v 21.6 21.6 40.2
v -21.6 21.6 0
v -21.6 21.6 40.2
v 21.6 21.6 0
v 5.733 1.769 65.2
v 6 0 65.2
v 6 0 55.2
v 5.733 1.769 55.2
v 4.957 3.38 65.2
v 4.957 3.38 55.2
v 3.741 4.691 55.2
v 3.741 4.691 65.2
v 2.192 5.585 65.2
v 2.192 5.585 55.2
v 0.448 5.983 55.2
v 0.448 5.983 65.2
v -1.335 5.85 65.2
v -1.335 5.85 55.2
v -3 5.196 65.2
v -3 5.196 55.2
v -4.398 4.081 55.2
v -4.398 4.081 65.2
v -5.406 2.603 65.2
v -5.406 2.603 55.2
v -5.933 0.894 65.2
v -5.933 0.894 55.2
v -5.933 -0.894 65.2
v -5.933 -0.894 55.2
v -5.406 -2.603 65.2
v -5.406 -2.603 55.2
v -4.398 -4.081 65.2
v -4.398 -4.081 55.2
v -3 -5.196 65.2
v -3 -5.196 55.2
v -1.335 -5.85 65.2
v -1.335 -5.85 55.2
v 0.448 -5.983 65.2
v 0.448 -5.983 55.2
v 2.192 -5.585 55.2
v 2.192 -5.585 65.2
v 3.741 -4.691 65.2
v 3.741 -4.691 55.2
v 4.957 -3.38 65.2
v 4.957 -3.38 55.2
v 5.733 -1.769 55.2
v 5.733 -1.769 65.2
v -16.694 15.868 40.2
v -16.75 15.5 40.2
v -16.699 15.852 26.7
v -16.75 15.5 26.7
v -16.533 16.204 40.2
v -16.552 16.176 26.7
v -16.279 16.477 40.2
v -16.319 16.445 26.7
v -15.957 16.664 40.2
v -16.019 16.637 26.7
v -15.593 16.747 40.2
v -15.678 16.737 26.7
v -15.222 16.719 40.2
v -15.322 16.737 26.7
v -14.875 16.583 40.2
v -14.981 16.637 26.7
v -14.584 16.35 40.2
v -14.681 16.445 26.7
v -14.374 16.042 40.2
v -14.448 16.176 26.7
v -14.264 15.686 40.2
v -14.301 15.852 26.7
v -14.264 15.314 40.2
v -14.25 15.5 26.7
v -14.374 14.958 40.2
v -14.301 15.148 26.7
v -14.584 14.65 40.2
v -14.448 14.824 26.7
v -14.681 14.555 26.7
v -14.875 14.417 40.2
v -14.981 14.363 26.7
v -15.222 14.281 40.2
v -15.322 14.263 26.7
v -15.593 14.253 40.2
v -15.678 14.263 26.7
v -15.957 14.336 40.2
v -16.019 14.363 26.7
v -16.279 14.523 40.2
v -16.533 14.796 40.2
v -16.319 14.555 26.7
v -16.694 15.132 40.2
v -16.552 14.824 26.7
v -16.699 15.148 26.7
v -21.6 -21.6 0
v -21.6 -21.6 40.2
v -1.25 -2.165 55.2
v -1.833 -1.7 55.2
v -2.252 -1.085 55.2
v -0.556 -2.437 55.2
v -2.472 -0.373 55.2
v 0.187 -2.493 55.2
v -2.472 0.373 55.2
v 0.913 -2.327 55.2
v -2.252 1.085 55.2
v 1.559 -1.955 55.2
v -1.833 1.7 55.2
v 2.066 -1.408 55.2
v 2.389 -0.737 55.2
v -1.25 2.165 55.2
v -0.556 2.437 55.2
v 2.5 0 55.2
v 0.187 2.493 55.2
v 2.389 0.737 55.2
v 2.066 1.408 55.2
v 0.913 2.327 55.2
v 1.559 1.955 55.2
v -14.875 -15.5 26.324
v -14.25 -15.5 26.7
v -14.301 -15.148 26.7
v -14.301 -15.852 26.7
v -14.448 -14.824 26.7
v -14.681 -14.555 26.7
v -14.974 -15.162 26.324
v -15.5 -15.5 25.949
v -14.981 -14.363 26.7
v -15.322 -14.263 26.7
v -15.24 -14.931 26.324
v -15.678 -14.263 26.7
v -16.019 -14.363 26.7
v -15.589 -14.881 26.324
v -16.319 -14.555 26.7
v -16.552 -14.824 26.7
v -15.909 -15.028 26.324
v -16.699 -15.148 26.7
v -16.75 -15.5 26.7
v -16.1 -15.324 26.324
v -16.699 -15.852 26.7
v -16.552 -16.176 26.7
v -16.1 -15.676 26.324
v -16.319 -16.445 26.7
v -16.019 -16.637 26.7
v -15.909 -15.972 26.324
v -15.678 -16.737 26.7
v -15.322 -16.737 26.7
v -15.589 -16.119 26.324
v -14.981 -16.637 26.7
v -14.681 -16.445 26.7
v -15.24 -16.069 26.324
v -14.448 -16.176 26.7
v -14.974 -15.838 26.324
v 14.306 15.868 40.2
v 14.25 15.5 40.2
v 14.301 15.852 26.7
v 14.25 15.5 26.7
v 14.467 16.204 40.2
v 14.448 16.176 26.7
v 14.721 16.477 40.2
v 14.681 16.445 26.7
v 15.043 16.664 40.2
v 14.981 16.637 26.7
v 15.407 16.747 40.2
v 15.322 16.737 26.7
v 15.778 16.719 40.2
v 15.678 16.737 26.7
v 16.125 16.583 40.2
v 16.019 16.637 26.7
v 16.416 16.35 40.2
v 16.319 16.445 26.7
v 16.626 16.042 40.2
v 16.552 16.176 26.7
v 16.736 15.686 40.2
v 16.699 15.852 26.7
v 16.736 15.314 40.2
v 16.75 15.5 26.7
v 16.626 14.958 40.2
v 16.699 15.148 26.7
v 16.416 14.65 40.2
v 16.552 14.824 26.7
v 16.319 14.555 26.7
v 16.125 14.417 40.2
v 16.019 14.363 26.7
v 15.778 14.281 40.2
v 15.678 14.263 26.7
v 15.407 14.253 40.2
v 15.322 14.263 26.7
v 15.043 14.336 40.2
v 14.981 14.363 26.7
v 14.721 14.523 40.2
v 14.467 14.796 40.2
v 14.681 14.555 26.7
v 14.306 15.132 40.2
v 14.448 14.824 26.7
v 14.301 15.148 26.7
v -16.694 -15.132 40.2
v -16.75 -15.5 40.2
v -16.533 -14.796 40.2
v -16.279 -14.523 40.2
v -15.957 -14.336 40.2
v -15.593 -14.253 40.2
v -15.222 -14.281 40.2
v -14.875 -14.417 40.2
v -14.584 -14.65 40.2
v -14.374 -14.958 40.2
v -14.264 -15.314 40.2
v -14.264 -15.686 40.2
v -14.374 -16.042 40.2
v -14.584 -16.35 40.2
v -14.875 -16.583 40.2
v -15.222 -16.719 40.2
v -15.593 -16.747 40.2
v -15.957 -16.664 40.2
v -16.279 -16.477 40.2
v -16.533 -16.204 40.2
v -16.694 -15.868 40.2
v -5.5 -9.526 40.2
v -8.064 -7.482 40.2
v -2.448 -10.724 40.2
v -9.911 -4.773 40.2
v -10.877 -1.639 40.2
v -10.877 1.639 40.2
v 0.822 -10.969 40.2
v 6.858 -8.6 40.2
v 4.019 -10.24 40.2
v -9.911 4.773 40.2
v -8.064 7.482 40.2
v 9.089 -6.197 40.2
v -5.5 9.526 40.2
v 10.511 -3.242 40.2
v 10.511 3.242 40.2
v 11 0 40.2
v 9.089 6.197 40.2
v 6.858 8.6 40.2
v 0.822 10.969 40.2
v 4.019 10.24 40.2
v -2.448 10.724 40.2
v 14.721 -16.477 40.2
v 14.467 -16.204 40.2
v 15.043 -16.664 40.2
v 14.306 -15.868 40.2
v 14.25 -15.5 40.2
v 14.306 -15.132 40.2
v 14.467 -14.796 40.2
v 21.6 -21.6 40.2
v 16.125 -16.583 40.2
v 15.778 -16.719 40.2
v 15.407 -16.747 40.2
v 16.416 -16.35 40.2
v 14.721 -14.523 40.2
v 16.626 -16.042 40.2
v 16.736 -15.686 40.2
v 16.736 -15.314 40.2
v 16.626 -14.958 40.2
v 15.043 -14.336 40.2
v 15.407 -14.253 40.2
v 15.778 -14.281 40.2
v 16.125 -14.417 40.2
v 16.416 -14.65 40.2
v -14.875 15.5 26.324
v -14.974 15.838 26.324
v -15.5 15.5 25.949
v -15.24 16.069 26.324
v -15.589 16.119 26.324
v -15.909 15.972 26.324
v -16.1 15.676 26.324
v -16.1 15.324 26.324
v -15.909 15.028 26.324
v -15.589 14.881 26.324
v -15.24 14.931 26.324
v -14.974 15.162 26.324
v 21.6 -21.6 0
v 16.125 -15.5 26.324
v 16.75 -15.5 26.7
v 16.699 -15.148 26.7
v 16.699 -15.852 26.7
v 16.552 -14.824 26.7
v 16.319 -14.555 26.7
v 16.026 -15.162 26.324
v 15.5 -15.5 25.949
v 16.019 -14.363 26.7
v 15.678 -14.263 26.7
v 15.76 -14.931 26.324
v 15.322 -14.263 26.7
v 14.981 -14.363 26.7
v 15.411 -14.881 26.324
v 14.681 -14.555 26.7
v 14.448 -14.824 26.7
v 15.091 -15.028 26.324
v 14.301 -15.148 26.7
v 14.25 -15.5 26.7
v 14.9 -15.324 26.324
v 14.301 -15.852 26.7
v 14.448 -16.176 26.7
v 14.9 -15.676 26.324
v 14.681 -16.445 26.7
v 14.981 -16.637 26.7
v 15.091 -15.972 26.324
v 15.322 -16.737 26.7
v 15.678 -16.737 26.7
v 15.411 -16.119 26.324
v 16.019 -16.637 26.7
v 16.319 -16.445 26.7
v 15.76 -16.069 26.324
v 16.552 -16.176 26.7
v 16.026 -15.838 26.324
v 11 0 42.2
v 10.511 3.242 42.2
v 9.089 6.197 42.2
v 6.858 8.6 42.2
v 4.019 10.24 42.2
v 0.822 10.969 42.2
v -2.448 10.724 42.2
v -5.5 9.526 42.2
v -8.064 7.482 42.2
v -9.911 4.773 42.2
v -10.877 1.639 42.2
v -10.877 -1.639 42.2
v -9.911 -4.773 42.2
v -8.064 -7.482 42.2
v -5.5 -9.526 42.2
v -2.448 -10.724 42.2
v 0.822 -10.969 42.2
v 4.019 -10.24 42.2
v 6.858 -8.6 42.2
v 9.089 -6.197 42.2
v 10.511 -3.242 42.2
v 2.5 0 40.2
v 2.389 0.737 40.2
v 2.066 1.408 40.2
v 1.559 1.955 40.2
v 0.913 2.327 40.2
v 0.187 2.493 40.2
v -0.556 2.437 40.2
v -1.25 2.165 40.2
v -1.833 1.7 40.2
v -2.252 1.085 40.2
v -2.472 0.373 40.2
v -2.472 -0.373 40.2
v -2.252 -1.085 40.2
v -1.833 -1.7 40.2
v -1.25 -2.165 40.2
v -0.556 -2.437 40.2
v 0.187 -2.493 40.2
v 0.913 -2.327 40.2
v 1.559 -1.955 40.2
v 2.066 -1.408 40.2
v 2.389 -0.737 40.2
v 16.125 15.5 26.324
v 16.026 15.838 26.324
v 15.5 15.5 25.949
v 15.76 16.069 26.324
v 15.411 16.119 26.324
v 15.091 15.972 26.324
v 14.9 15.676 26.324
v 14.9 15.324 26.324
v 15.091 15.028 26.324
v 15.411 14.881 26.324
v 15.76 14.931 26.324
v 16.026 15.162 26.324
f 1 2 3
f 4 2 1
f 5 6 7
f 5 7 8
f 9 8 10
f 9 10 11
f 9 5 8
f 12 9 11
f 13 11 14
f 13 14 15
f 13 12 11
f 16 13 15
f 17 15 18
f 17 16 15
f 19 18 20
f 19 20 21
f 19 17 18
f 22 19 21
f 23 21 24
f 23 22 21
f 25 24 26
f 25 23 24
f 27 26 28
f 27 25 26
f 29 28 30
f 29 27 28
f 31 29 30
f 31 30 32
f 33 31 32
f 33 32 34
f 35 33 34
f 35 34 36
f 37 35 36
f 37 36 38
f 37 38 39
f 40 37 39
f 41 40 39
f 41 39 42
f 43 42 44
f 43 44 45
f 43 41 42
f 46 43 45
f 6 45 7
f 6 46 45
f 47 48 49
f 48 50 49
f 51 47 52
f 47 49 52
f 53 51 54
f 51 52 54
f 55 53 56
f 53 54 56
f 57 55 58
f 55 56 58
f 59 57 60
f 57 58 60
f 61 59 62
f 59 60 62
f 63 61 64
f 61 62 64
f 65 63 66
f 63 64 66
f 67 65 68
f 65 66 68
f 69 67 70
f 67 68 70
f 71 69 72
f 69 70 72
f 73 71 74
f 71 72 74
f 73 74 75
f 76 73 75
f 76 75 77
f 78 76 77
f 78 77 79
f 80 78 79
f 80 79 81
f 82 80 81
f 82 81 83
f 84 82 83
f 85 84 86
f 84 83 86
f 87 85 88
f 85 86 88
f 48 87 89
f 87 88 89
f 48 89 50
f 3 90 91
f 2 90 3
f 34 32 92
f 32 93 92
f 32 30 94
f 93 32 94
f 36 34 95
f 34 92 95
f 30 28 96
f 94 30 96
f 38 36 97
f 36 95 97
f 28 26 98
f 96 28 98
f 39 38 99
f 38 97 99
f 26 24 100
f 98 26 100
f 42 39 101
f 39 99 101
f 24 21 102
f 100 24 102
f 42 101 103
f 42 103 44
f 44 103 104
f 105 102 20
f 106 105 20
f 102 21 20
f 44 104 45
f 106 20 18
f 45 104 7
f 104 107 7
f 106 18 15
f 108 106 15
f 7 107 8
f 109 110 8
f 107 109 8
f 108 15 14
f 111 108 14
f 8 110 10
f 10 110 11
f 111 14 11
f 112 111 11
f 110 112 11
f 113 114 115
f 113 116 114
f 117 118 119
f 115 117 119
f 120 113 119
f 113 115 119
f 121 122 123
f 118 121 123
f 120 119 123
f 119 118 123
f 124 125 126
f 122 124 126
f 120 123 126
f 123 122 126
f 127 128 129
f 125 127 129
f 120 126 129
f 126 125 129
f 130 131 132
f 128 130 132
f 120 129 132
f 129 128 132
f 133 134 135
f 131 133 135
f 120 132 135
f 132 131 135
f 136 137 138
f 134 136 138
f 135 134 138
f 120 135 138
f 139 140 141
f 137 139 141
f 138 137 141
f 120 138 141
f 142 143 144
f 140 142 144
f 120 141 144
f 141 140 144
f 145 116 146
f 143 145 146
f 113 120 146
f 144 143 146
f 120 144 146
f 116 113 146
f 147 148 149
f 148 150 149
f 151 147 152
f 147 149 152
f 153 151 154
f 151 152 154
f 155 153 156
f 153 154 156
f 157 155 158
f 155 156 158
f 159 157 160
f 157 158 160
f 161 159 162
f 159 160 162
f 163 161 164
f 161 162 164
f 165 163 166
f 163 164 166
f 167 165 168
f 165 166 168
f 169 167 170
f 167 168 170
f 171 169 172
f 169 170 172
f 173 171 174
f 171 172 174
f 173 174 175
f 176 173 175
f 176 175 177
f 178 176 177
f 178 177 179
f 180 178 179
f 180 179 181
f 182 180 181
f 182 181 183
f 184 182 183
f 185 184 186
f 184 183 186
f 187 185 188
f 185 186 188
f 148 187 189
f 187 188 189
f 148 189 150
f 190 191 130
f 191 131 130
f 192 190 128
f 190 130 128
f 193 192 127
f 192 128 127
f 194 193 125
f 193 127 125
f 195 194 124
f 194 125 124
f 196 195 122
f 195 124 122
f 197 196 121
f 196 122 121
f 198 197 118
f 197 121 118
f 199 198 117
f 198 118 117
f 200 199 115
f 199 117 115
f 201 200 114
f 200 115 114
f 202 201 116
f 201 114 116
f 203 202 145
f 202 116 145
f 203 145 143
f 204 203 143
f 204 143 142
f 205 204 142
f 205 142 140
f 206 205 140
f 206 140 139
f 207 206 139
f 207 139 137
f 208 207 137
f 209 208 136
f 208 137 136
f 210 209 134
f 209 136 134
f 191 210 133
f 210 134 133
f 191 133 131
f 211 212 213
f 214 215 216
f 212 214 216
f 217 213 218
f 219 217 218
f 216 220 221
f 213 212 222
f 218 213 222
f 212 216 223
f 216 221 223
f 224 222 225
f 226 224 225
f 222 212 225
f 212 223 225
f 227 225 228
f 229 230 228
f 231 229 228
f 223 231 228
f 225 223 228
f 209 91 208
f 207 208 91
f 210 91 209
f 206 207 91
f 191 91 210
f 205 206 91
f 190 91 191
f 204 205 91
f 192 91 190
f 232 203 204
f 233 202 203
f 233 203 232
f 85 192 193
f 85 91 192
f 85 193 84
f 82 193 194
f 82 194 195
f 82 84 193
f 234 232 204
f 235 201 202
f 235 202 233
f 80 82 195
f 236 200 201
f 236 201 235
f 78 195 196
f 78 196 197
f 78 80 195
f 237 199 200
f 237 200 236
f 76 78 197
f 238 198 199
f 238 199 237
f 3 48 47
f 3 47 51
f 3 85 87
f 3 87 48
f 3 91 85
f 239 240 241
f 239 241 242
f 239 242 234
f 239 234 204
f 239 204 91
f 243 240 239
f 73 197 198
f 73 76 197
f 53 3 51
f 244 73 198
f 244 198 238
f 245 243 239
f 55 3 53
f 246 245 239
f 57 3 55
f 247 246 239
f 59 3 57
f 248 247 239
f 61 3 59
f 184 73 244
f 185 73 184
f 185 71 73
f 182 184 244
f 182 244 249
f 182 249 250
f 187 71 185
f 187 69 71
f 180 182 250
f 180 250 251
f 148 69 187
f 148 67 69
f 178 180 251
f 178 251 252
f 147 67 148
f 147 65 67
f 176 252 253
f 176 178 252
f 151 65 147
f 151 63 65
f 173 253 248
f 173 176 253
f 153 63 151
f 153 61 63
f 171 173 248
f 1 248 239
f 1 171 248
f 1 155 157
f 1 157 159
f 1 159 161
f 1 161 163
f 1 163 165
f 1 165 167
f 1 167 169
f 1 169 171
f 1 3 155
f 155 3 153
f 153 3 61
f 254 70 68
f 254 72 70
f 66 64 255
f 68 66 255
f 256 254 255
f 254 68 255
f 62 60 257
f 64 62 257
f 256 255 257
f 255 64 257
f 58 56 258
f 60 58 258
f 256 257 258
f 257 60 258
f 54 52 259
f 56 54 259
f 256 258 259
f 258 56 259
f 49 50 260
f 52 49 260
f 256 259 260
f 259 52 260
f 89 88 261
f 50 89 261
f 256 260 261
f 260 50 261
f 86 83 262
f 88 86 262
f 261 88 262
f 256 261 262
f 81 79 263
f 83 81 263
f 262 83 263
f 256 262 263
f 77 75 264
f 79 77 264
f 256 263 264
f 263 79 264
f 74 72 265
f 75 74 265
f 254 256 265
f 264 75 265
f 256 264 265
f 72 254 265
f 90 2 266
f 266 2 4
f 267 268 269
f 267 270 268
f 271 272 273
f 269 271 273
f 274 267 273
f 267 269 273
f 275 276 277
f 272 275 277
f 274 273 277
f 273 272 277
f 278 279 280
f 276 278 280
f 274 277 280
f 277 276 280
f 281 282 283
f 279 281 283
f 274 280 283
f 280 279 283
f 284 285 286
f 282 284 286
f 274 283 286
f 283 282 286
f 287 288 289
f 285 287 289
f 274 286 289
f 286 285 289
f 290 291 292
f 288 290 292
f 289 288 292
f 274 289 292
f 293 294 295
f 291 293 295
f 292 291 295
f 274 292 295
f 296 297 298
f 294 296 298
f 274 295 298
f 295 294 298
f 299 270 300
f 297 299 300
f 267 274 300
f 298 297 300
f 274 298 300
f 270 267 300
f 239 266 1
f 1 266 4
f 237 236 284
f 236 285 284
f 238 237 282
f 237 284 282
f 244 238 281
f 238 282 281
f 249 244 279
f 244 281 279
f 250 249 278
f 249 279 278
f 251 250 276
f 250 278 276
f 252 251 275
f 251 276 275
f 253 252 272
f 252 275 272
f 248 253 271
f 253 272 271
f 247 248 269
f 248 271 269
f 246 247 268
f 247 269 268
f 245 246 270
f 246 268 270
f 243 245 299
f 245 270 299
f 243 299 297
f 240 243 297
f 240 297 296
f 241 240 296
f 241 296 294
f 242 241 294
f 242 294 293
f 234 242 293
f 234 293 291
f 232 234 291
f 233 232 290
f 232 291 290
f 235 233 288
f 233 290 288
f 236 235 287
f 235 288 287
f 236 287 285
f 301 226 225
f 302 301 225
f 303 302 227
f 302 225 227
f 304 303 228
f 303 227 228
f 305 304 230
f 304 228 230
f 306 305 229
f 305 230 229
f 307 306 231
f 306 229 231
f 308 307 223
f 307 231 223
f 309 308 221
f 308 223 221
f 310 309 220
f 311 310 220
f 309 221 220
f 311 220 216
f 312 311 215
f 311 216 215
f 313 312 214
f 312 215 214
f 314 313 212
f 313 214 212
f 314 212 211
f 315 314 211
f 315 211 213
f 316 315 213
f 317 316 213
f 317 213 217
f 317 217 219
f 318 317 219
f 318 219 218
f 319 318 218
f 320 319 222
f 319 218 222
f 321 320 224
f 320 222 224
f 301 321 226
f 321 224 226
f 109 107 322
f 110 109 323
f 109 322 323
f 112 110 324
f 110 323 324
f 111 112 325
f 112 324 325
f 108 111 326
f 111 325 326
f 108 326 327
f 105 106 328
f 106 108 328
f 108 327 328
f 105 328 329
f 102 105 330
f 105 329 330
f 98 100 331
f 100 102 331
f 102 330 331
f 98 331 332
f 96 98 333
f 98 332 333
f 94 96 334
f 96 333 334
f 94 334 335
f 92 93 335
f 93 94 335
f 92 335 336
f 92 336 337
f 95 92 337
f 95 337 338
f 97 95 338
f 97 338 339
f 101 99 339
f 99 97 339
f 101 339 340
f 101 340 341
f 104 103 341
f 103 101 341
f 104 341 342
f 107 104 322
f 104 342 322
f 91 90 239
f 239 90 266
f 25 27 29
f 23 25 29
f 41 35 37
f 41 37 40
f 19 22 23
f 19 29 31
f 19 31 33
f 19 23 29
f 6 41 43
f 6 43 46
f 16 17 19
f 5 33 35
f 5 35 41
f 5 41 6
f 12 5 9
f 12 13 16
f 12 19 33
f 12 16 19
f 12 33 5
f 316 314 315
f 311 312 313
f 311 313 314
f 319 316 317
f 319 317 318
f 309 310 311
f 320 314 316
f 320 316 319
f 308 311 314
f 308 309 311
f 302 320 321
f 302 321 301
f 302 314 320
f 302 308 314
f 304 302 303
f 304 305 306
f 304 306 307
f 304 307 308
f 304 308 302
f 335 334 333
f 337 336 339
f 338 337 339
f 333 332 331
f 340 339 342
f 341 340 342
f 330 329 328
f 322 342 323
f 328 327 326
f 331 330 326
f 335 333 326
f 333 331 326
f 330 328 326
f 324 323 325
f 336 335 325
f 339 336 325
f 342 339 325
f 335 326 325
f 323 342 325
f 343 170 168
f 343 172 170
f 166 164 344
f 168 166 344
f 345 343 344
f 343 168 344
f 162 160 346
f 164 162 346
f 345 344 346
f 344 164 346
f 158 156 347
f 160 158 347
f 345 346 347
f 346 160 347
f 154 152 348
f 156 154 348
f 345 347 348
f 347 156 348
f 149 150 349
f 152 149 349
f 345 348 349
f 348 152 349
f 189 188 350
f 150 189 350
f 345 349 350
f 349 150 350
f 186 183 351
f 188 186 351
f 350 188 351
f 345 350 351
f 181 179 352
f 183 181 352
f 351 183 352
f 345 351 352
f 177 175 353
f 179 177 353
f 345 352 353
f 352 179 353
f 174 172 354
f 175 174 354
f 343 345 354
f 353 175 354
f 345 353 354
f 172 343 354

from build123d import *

# Parameters (mm, degrees)
F0_W     = 43.2
F0_H     = 43.2
F1_DEPTH = 40.2
F2_R     = 2.5
F3_DEPTH = 25
F4_D     = 2.5
F4_DEPTH = 13.5
F4_TIP   = 0.7510757738
F5_R     = 11
F6_DEPTH = 2
F7_R     = 6
F8_DEPTH = 10


with BuildPart() as f1:
    # F0 (on Top) → F1 (new body)
    with BuildSketch(Plane.XY):
        Rectangle(F0_W, F0_H)
    extrude(amount=F1_DEPTH)

    # F4
    with Locations(Plane.XY.offset(40.2)):
        with Locations((-15.5, -15.5), (-15.5, 15.5), (15.5, 15.5), (15.5, -15.5)):
            Hole(F4_D / 2, depth=F4_DEPTH)
            with Locations((0, 0, -(F4_DEPTH + F4_TIP / 2))):  # 118° drill point
                Cone(0, F4_D / 2, F4_TIP, mode=Mode.SUBTRACT)


with BuildPart() as f3:
    # F2 (on face) → F3 (new body)
    with BuildSketch(Plane.XY.offset(40.2)):
        Circle(F2_R)
    extrude(amount=F3_DEPTH)

    # F7 (on face) → F8 (join)
    with BuildSketch(Plane.XY.offset(65.2)):
        Circle(F7_R)
    extrude(amount=-F8_DEPTH)


with BuildPart() as f6:
    # F5 (on face) → F6 (new body)
    with BuildSketch(Plane.XY.offset(40.2)):
        Circle(F5_R)
    extrude(amount=F6_DEPTH)


solid = Compound([f1.part, f3.part, f6.part])
